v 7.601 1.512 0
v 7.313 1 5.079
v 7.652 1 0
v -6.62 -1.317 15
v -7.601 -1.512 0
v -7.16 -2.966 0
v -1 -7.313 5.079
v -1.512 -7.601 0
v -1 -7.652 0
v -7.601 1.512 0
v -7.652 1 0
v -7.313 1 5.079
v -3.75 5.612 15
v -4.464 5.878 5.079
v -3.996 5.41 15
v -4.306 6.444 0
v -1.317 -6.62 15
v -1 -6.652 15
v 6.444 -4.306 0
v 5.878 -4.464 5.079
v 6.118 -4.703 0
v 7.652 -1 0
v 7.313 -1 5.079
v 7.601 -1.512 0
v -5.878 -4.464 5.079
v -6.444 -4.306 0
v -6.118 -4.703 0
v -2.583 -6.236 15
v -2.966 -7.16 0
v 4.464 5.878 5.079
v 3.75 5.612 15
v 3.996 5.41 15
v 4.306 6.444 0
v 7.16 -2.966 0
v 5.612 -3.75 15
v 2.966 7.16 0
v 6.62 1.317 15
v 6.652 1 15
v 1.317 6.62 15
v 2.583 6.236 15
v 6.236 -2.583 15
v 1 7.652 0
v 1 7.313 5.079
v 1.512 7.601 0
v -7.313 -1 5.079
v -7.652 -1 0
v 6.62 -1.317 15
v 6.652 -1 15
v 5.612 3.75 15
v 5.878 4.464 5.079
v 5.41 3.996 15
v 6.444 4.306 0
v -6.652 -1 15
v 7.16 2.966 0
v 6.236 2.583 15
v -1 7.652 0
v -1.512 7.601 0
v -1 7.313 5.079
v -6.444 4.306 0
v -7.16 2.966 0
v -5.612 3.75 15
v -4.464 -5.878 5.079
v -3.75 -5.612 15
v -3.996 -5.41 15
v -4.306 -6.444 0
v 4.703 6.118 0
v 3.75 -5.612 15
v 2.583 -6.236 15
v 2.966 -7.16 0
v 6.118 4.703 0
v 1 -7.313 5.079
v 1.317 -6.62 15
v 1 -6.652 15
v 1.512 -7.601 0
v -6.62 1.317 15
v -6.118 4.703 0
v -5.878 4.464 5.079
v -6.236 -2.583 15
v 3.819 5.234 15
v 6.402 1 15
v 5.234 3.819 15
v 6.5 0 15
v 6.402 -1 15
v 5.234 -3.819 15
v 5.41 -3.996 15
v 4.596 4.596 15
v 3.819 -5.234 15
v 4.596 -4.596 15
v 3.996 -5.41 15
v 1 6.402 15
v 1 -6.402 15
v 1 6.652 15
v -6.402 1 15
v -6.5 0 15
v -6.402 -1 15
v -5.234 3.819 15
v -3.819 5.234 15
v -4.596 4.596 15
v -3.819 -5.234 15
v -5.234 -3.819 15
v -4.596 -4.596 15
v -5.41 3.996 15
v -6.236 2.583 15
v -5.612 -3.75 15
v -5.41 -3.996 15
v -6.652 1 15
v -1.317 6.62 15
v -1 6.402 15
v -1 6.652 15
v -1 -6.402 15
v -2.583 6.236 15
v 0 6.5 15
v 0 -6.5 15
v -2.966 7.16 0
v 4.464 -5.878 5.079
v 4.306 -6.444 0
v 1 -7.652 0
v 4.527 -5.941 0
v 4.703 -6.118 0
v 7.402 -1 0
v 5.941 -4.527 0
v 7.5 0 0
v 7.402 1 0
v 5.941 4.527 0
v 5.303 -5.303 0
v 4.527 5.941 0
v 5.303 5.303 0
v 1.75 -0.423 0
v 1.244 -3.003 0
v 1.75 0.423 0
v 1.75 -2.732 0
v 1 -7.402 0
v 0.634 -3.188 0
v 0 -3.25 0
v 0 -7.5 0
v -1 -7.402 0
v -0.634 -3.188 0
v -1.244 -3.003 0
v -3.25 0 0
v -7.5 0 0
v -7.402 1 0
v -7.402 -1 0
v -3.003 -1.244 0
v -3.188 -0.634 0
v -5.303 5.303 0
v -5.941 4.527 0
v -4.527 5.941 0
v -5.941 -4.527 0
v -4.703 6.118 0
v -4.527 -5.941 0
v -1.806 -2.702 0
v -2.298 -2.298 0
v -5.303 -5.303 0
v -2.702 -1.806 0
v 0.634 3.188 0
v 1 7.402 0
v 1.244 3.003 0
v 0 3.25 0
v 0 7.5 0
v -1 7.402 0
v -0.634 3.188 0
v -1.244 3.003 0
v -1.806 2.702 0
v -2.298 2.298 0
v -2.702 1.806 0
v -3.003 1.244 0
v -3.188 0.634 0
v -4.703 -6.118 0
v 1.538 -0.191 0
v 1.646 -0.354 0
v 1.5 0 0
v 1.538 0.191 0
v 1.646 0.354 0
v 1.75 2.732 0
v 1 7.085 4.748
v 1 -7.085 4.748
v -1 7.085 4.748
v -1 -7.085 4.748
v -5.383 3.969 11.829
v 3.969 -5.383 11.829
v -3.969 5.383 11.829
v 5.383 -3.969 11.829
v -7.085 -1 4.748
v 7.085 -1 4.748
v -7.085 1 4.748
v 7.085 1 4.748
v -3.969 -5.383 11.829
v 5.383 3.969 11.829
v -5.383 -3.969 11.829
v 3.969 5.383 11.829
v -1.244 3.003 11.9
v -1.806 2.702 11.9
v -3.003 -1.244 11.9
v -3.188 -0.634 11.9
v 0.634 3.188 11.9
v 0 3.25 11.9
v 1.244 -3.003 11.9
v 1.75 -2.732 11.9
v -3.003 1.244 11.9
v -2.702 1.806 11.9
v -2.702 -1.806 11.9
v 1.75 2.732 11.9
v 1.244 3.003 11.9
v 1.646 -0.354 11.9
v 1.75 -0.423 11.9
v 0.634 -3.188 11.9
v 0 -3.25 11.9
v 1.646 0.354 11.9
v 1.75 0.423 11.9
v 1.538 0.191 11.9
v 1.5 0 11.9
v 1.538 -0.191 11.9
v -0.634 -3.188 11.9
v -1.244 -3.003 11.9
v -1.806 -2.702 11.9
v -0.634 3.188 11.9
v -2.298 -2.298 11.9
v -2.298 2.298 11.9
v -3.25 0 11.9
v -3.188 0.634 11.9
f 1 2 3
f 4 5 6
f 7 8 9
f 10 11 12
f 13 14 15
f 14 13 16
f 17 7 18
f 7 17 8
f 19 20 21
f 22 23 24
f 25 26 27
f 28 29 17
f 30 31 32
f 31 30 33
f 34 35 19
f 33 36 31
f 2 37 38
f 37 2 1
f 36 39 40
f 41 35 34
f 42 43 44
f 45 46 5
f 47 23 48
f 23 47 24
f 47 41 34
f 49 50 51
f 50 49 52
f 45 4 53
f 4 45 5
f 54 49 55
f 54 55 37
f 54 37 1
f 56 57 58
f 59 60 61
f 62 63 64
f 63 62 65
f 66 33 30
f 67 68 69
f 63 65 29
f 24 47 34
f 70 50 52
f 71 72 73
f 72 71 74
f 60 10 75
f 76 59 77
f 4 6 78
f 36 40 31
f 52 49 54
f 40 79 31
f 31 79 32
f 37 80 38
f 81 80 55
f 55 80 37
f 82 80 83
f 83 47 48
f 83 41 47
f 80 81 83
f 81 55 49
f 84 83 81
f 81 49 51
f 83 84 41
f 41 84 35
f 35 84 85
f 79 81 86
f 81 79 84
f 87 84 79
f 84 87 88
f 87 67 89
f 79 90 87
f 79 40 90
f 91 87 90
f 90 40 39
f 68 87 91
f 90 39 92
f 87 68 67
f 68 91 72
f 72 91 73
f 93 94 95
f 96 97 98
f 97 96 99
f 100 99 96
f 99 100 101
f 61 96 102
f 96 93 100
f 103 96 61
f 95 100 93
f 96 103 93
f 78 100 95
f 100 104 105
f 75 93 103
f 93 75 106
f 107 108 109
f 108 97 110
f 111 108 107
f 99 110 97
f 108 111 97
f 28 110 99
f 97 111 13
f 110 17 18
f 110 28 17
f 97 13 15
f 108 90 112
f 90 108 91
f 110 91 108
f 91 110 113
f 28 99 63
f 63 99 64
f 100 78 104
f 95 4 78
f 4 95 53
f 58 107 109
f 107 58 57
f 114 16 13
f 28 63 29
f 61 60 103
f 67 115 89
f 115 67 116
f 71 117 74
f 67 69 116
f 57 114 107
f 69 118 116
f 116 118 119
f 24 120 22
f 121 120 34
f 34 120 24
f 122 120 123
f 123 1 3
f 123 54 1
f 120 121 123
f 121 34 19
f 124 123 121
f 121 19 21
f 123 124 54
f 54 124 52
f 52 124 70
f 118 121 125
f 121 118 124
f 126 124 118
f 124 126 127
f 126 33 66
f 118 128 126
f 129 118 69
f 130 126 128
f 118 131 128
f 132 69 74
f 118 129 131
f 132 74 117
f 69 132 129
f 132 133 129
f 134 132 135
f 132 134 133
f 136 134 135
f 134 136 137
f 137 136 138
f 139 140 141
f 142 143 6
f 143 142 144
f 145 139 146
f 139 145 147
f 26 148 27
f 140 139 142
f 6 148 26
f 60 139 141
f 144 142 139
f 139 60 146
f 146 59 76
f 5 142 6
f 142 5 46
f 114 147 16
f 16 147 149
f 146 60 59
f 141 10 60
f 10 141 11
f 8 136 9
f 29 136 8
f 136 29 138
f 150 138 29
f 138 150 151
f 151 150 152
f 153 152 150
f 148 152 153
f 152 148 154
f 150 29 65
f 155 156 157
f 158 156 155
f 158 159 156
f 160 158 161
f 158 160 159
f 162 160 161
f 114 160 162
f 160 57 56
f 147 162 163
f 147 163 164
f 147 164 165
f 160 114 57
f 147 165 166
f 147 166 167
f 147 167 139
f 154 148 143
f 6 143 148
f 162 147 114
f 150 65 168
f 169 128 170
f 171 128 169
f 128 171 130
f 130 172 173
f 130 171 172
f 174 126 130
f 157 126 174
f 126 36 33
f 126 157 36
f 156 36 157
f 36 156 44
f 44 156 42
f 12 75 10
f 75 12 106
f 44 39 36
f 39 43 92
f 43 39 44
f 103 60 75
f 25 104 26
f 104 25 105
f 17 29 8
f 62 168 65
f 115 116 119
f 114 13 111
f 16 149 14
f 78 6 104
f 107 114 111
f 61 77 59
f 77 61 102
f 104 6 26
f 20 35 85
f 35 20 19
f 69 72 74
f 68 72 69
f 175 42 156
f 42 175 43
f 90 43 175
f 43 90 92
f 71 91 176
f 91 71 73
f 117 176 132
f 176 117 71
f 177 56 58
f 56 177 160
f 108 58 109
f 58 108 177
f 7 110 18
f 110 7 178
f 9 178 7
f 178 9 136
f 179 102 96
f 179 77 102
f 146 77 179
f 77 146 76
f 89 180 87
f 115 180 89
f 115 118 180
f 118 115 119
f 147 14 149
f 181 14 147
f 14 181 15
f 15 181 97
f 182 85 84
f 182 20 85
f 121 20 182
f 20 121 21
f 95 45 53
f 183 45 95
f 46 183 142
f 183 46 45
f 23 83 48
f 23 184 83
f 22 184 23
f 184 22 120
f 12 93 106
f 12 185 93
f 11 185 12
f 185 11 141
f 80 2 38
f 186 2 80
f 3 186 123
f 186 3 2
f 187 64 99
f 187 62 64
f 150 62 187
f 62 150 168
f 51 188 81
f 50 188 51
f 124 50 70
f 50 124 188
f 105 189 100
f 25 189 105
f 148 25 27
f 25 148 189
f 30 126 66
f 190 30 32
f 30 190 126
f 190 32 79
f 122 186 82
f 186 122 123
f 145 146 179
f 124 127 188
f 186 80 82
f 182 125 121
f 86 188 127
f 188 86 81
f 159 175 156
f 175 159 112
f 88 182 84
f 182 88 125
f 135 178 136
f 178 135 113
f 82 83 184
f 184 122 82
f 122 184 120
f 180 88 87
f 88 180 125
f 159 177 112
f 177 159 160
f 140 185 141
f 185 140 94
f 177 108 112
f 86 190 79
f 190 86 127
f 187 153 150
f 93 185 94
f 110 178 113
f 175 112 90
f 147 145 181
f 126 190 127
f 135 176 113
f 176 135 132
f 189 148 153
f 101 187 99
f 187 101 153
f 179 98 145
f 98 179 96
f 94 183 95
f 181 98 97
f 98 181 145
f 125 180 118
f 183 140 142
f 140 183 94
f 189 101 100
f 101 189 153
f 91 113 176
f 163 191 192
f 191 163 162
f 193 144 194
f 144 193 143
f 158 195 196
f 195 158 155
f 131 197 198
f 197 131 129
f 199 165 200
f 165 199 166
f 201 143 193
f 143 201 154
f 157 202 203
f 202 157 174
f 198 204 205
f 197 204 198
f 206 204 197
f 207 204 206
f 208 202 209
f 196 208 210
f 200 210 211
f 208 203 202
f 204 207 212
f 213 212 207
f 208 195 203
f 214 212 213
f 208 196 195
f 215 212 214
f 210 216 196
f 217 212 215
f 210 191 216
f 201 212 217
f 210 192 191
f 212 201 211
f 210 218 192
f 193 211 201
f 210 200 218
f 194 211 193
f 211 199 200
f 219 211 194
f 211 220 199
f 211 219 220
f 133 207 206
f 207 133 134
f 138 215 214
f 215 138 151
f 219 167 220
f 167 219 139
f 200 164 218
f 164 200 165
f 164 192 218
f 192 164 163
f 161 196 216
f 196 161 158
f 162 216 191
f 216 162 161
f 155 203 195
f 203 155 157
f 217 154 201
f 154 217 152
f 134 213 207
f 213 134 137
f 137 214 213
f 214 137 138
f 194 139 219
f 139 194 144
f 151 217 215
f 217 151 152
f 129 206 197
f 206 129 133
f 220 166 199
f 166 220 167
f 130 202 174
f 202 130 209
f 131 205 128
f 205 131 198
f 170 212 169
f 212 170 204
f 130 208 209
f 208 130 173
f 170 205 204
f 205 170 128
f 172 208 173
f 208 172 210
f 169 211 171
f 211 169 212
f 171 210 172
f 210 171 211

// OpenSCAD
knob_dia = 6;
knob_height =12;
knob_flat = 4.5;
$fn=32;

module spindle_hole()
{
    difference()
    {
        cylinder(d=knob_dia+0.5,h=knob_height);
        translate([knob_flat - (knob_dia/2)+0.25,-5,-1]) cube([10,10,knob_height+2]);
        translate([knob_flat - (knob_dia/2)+.5,0,-1]) cylinder(d=1,h=knob_height+2, $fn=16);
    }
}

module knob_outer()
{
    union()
    {
        cylinder(d1=15,d2=13,h=knob_height+3);
        difference()
        {
            cylinder(d1=15.5,d2=13.5,h=knob_height+3);
            translate([0,0,(knob_height+3)/2]) rotate([0,0,0]) cube([2,18,knob_height+5], center=true);
            translate([0,0,(knob_height+3)/2]) rotate([0,0,45]) cube([2,18,knob_height+5], center=true);
            translate([0,0,(knob_height+3)/2]) rotate([0,0,90]) cube([2,18,knob_height+5], center=true);
            translate([0,0,(knob_height+3)/2]) rotate([0,0,-45]) cube([2,18,knob_height+5], center=true);
        }
    }
}

module knob_complete()
{
    difference()
    {
        knob_outer();
        translate([0,0,-0.1]) spindle_hole();
    }
}

knob_complete();
